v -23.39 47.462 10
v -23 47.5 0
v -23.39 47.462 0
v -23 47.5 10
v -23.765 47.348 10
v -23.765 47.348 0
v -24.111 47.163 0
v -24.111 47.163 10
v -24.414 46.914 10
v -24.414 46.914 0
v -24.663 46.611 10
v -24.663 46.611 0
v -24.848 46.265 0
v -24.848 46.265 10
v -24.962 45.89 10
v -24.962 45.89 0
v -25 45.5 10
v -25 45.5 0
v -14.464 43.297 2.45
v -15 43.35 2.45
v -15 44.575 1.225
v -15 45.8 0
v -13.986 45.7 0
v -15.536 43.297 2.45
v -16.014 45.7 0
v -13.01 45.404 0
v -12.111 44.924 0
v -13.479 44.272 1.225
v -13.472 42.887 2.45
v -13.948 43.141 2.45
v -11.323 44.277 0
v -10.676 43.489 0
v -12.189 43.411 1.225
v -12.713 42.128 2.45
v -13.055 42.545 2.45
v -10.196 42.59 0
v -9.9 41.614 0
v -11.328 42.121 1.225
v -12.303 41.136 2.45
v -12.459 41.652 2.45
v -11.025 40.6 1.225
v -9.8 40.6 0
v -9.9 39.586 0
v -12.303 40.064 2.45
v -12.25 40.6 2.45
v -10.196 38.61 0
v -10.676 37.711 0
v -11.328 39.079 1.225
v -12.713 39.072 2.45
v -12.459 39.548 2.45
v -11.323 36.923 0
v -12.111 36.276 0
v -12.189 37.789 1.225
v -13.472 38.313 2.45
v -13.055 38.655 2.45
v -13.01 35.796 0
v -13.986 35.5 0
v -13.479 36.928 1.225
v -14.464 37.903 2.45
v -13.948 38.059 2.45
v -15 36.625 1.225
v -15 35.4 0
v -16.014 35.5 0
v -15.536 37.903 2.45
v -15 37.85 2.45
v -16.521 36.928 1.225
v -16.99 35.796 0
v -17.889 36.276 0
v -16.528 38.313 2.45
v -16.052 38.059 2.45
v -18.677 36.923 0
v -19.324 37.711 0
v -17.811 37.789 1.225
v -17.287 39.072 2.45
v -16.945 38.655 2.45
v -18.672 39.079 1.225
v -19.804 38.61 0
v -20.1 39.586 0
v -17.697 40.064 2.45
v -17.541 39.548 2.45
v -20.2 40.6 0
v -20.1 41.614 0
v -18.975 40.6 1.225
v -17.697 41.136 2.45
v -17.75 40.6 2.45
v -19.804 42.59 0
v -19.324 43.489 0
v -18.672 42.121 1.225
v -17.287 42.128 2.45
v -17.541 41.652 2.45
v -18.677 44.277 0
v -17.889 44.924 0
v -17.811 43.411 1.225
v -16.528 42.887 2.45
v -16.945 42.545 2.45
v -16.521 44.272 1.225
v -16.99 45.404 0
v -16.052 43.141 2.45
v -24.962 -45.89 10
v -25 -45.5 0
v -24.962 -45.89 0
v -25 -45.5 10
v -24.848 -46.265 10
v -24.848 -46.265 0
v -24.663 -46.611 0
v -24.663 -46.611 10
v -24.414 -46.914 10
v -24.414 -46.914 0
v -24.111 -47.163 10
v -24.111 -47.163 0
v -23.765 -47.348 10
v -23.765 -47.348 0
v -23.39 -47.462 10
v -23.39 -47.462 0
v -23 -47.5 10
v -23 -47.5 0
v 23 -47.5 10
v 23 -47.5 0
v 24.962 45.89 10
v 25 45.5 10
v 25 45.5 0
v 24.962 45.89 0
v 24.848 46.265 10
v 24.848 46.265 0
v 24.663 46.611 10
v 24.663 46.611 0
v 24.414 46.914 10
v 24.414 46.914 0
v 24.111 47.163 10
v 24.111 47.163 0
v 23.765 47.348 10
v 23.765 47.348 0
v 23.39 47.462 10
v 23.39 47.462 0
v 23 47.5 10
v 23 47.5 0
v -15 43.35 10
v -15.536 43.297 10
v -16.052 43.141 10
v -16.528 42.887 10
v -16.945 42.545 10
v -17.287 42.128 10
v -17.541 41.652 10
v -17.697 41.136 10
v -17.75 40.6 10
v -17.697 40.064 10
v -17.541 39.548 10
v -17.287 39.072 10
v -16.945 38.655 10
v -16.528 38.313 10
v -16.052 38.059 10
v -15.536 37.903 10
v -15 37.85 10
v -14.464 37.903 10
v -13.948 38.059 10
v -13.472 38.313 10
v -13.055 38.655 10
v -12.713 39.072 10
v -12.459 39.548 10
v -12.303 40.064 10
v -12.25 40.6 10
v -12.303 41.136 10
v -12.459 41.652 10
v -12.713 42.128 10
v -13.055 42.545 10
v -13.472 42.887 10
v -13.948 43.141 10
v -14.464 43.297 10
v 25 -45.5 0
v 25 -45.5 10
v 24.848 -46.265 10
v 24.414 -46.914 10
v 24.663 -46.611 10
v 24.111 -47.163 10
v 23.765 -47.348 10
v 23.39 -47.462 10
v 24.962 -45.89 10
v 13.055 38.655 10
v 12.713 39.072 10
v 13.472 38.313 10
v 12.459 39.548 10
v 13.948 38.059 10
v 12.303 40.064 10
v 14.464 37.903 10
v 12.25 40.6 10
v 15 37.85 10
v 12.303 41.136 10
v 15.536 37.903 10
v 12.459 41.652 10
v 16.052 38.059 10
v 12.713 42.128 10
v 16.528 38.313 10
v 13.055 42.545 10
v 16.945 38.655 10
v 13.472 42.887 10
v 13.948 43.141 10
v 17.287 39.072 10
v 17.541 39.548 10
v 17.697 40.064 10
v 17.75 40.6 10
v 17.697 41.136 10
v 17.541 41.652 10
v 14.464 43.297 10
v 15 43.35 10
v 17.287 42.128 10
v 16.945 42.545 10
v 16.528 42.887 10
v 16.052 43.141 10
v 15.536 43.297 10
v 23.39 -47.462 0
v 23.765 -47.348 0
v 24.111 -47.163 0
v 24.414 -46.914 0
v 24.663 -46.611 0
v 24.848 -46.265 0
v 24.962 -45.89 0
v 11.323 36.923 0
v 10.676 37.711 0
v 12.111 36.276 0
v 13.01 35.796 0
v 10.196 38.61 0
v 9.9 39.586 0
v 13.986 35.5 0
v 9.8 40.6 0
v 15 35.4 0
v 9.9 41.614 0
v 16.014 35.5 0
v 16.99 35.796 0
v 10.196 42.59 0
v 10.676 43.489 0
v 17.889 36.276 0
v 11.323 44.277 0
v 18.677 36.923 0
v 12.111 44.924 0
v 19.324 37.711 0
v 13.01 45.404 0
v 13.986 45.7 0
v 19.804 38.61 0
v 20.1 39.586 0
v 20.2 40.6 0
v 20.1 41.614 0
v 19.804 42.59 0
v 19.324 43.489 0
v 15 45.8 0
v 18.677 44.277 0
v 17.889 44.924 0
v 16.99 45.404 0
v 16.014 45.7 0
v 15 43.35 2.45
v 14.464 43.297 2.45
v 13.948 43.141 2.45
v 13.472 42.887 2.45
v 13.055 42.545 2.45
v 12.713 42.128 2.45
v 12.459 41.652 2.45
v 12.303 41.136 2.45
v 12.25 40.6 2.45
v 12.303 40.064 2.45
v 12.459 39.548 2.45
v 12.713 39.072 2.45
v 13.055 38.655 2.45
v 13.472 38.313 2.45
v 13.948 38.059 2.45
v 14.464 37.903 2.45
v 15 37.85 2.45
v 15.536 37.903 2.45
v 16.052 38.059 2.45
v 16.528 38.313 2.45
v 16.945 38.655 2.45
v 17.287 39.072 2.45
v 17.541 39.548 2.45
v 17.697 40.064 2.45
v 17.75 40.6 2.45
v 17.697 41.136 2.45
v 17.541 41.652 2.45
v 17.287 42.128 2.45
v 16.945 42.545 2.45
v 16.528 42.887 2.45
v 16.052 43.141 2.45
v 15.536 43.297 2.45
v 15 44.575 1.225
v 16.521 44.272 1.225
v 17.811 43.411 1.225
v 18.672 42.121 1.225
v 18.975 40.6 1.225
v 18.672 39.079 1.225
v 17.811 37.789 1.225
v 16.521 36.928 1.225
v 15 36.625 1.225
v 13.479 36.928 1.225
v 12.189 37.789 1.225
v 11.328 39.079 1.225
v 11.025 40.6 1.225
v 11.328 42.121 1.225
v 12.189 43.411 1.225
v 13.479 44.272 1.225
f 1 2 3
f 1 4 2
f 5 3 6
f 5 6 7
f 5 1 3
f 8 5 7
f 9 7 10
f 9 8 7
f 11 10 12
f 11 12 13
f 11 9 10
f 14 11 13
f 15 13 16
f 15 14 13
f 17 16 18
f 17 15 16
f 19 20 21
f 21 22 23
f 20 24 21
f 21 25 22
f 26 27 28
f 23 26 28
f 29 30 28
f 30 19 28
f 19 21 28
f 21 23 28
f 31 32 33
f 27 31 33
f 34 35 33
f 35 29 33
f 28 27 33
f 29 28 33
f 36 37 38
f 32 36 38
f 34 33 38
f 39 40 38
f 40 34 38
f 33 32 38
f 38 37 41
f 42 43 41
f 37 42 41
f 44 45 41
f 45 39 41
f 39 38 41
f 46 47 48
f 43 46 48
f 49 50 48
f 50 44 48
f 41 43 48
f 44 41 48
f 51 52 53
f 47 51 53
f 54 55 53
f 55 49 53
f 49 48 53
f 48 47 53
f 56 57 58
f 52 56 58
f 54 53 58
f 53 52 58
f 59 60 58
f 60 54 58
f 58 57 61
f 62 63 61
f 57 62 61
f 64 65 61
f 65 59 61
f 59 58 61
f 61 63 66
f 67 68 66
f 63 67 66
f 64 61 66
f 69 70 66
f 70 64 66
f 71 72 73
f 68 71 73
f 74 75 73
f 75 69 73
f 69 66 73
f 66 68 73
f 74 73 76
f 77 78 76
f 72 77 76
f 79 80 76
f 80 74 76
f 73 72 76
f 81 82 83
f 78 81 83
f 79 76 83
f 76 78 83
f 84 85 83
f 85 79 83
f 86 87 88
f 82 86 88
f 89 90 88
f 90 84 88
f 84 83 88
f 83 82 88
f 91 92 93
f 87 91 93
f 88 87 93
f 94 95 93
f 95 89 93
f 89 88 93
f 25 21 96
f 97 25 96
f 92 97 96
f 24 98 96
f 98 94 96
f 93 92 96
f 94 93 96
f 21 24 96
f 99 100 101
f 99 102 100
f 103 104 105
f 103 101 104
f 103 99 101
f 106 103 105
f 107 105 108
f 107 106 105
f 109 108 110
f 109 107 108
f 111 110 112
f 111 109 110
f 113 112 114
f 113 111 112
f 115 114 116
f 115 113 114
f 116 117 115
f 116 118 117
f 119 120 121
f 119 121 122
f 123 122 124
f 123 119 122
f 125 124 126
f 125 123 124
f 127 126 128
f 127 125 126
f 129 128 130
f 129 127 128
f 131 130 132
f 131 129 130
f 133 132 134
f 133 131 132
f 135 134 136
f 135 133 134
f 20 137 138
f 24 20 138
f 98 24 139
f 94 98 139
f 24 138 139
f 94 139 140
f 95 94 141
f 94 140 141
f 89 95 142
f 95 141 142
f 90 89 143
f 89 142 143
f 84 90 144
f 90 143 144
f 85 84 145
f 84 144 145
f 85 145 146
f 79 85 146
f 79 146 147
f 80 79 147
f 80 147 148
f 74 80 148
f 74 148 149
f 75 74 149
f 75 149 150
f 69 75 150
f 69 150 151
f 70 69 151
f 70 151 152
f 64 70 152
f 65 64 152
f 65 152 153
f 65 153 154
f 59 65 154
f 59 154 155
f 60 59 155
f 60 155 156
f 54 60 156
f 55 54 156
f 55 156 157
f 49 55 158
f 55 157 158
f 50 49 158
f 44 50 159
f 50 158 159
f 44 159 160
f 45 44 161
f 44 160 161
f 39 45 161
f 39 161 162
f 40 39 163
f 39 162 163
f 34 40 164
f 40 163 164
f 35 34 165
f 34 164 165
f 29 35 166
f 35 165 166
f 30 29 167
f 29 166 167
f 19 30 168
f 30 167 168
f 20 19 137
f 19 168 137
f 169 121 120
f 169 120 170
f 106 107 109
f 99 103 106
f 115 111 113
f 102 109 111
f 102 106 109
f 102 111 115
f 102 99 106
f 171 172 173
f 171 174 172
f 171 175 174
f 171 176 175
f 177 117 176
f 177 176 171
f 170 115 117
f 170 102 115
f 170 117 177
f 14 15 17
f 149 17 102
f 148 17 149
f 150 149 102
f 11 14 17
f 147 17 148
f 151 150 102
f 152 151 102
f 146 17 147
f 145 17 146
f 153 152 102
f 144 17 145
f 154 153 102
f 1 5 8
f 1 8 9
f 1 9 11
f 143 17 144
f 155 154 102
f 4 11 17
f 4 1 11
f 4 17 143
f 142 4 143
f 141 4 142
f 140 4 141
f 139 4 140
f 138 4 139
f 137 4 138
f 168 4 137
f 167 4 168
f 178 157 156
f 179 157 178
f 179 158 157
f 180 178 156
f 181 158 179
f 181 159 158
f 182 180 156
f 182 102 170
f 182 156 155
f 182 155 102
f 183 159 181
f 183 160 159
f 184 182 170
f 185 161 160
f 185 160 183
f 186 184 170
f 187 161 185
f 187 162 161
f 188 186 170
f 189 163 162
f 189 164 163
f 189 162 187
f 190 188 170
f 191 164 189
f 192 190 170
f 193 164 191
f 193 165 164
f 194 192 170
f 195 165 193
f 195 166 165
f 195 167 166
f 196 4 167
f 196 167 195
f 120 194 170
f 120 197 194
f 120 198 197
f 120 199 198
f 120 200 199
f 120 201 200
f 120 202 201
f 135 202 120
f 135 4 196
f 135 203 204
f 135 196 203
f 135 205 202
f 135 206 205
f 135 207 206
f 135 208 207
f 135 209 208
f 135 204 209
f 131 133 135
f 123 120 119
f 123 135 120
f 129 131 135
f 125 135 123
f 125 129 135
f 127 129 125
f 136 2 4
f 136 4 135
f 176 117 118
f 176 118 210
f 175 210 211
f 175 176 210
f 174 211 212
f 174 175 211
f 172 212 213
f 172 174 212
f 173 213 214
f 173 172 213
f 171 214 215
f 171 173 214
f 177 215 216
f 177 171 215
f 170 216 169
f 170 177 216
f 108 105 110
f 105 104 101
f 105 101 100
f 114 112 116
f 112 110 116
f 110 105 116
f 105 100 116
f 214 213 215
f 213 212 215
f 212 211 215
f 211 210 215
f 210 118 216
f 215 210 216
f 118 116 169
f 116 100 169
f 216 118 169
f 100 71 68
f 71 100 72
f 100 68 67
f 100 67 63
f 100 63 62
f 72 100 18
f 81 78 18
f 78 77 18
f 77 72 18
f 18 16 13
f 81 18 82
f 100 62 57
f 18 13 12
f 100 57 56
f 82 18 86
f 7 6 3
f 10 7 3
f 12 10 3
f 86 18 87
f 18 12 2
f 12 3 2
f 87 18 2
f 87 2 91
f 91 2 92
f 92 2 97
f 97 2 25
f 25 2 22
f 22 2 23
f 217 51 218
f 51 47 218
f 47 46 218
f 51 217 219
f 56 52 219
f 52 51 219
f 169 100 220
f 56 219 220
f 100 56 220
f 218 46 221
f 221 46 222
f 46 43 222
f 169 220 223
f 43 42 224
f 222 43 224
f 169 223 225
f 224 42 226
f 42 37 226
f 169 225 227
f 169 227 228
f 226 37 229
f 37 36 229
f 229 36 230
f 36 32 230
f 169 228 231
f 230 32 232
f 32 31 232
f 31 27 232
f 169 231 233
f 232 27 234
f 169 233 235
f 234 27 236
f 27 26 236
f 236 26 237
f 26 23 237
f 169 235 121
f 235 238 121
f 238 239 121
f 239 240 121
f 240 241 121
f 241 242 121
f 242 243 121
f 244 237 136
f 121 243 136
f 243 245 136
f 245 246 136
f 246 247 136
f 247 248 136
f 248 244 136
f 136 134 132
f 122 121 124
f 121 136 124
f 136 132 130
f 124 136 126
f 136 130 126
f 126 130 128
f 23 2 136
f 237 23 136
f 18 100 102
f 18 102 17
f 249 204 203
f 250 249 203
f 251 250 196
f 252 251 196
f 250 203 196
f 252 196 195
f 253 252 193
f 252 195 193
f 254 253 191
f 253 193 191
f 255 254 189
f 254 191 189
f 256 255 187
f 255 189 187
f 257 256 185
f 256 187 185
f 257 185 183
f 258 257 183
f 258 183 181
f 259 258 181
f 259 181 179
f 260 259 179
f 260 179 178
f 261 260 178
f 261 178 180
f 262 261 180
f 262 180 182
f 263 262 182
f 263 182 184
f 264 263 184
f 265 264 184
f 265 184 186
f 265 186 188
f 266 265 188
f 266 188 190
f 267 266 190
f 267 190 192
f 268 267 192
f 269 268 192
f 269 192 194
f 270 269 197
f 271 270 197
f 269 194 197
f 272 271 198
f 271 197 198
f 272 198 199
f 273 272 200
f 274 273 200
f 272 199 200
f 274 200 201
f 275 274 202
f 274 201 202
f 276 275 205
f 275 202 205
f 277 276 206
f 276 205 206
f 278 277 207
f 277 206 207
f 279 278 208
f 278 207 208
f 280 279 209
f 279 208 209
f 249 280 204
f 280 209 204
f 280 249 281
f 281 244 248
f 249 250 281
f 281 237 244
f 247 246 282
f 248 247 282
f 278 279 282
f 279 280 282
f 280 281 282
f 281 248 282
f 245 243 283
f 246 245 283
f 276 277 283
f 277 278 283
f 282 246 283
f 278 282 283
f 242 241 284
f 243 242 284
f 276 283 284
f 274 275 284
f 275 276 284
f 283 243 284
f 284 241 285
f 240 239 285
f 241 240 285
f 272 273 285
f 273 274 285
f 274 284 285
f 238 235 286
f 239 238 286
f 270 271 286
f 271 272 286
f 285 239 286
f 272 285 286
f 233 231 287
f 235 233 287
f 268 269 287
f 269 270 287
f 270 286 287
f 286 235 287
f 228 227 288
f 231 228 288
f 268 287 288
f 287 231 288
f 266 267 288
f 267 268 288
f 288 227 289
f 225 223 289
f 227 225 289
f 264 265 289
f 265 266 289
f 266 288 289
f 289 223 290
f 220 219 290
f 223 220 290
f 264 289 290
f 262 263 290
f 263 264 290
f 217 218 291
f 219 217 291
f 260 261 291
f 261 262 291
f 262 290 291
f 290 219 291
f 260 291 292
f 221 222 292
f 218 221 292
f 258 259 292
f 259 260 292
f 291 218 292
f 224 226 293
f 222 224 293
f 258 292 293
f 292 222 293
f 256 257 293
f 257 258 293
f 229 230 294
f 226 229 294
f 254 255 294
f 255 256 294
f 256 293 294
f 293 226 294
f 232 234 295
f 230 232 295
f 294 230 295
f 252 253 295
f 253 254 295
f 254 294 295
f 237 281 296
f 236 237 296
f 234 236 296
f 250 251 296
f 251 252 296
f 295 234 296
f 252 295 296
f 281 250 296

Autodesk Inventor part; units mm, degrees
ref_plane "YZ Plane" through (0, 0, 0) normal (1, 0, 0) x (0, 1, 0)
ref_plane "XZ Plane" through (0, 0, 0) normal (0, 1, 0) x (-1, 0, 0)
ref_plane "XY Plane" through (0, 0, 0) normal (0, 0, 1) x (1, 0, 0)
sketch "Schizzo2" plane through (0, 0, 0) normal (0, 0, 1) x (1, 0, 0)
  line L0 (-25, 47.5) -> (25, 47.5)
  line L1 (25, 47.5) -> (25, -47.5)
  line L2 (25, -47.5) -> (-25, -47.5)
  line L3 (-25, -47.5) -> (-25, 47.5)
  line L4 (-25, 47.5) -> (25, -47.5) construction
  line L5 (25, 47.5) -> (-25, -47.5) construction
  point P0 (0, 0)
  dimension "d0" = 50
  dimension "d1" = 95
extrude "Estrusione1" add sketch "Schizzo2" along normal blind 10
fillet "Raccordo1" radius 2 4 edges at (25, 47.5, 5) (-25, 47.5, 5) (25, -47.5, 5) (-25, -47.5, 5)
sketch "Schizzo3" plane through (0, 0, 0) normal (0, 0, -1) x (-1, 0, 0)
  line L0 (23, 47.5) -> (-23, 47.5) projected
  line L1 (25, -45.5) -> (25, 45.5) projected
  line L2 (-25, 45.5) -> (-25, -45.5) projected
  point P0 (0, 0)
  point P1 (15, 40.6)
  point P2 (-15, 40.6)
  dimension "d5" = 6.9
  dimension "d6" = 10
  dimension "d7" = 10
hole "Foro1" at (-15, 40.6, 0) at (15, 40.6, 0) direction (0, 0, 1) diameter 5.5 end through all countersink diameter 10.4 countersink angle 90 clearance for "Vite a testa svasata piana ISO 2009/7046" size "M5" standard "ISO"
properties part number "Piastra sostegno asse"
